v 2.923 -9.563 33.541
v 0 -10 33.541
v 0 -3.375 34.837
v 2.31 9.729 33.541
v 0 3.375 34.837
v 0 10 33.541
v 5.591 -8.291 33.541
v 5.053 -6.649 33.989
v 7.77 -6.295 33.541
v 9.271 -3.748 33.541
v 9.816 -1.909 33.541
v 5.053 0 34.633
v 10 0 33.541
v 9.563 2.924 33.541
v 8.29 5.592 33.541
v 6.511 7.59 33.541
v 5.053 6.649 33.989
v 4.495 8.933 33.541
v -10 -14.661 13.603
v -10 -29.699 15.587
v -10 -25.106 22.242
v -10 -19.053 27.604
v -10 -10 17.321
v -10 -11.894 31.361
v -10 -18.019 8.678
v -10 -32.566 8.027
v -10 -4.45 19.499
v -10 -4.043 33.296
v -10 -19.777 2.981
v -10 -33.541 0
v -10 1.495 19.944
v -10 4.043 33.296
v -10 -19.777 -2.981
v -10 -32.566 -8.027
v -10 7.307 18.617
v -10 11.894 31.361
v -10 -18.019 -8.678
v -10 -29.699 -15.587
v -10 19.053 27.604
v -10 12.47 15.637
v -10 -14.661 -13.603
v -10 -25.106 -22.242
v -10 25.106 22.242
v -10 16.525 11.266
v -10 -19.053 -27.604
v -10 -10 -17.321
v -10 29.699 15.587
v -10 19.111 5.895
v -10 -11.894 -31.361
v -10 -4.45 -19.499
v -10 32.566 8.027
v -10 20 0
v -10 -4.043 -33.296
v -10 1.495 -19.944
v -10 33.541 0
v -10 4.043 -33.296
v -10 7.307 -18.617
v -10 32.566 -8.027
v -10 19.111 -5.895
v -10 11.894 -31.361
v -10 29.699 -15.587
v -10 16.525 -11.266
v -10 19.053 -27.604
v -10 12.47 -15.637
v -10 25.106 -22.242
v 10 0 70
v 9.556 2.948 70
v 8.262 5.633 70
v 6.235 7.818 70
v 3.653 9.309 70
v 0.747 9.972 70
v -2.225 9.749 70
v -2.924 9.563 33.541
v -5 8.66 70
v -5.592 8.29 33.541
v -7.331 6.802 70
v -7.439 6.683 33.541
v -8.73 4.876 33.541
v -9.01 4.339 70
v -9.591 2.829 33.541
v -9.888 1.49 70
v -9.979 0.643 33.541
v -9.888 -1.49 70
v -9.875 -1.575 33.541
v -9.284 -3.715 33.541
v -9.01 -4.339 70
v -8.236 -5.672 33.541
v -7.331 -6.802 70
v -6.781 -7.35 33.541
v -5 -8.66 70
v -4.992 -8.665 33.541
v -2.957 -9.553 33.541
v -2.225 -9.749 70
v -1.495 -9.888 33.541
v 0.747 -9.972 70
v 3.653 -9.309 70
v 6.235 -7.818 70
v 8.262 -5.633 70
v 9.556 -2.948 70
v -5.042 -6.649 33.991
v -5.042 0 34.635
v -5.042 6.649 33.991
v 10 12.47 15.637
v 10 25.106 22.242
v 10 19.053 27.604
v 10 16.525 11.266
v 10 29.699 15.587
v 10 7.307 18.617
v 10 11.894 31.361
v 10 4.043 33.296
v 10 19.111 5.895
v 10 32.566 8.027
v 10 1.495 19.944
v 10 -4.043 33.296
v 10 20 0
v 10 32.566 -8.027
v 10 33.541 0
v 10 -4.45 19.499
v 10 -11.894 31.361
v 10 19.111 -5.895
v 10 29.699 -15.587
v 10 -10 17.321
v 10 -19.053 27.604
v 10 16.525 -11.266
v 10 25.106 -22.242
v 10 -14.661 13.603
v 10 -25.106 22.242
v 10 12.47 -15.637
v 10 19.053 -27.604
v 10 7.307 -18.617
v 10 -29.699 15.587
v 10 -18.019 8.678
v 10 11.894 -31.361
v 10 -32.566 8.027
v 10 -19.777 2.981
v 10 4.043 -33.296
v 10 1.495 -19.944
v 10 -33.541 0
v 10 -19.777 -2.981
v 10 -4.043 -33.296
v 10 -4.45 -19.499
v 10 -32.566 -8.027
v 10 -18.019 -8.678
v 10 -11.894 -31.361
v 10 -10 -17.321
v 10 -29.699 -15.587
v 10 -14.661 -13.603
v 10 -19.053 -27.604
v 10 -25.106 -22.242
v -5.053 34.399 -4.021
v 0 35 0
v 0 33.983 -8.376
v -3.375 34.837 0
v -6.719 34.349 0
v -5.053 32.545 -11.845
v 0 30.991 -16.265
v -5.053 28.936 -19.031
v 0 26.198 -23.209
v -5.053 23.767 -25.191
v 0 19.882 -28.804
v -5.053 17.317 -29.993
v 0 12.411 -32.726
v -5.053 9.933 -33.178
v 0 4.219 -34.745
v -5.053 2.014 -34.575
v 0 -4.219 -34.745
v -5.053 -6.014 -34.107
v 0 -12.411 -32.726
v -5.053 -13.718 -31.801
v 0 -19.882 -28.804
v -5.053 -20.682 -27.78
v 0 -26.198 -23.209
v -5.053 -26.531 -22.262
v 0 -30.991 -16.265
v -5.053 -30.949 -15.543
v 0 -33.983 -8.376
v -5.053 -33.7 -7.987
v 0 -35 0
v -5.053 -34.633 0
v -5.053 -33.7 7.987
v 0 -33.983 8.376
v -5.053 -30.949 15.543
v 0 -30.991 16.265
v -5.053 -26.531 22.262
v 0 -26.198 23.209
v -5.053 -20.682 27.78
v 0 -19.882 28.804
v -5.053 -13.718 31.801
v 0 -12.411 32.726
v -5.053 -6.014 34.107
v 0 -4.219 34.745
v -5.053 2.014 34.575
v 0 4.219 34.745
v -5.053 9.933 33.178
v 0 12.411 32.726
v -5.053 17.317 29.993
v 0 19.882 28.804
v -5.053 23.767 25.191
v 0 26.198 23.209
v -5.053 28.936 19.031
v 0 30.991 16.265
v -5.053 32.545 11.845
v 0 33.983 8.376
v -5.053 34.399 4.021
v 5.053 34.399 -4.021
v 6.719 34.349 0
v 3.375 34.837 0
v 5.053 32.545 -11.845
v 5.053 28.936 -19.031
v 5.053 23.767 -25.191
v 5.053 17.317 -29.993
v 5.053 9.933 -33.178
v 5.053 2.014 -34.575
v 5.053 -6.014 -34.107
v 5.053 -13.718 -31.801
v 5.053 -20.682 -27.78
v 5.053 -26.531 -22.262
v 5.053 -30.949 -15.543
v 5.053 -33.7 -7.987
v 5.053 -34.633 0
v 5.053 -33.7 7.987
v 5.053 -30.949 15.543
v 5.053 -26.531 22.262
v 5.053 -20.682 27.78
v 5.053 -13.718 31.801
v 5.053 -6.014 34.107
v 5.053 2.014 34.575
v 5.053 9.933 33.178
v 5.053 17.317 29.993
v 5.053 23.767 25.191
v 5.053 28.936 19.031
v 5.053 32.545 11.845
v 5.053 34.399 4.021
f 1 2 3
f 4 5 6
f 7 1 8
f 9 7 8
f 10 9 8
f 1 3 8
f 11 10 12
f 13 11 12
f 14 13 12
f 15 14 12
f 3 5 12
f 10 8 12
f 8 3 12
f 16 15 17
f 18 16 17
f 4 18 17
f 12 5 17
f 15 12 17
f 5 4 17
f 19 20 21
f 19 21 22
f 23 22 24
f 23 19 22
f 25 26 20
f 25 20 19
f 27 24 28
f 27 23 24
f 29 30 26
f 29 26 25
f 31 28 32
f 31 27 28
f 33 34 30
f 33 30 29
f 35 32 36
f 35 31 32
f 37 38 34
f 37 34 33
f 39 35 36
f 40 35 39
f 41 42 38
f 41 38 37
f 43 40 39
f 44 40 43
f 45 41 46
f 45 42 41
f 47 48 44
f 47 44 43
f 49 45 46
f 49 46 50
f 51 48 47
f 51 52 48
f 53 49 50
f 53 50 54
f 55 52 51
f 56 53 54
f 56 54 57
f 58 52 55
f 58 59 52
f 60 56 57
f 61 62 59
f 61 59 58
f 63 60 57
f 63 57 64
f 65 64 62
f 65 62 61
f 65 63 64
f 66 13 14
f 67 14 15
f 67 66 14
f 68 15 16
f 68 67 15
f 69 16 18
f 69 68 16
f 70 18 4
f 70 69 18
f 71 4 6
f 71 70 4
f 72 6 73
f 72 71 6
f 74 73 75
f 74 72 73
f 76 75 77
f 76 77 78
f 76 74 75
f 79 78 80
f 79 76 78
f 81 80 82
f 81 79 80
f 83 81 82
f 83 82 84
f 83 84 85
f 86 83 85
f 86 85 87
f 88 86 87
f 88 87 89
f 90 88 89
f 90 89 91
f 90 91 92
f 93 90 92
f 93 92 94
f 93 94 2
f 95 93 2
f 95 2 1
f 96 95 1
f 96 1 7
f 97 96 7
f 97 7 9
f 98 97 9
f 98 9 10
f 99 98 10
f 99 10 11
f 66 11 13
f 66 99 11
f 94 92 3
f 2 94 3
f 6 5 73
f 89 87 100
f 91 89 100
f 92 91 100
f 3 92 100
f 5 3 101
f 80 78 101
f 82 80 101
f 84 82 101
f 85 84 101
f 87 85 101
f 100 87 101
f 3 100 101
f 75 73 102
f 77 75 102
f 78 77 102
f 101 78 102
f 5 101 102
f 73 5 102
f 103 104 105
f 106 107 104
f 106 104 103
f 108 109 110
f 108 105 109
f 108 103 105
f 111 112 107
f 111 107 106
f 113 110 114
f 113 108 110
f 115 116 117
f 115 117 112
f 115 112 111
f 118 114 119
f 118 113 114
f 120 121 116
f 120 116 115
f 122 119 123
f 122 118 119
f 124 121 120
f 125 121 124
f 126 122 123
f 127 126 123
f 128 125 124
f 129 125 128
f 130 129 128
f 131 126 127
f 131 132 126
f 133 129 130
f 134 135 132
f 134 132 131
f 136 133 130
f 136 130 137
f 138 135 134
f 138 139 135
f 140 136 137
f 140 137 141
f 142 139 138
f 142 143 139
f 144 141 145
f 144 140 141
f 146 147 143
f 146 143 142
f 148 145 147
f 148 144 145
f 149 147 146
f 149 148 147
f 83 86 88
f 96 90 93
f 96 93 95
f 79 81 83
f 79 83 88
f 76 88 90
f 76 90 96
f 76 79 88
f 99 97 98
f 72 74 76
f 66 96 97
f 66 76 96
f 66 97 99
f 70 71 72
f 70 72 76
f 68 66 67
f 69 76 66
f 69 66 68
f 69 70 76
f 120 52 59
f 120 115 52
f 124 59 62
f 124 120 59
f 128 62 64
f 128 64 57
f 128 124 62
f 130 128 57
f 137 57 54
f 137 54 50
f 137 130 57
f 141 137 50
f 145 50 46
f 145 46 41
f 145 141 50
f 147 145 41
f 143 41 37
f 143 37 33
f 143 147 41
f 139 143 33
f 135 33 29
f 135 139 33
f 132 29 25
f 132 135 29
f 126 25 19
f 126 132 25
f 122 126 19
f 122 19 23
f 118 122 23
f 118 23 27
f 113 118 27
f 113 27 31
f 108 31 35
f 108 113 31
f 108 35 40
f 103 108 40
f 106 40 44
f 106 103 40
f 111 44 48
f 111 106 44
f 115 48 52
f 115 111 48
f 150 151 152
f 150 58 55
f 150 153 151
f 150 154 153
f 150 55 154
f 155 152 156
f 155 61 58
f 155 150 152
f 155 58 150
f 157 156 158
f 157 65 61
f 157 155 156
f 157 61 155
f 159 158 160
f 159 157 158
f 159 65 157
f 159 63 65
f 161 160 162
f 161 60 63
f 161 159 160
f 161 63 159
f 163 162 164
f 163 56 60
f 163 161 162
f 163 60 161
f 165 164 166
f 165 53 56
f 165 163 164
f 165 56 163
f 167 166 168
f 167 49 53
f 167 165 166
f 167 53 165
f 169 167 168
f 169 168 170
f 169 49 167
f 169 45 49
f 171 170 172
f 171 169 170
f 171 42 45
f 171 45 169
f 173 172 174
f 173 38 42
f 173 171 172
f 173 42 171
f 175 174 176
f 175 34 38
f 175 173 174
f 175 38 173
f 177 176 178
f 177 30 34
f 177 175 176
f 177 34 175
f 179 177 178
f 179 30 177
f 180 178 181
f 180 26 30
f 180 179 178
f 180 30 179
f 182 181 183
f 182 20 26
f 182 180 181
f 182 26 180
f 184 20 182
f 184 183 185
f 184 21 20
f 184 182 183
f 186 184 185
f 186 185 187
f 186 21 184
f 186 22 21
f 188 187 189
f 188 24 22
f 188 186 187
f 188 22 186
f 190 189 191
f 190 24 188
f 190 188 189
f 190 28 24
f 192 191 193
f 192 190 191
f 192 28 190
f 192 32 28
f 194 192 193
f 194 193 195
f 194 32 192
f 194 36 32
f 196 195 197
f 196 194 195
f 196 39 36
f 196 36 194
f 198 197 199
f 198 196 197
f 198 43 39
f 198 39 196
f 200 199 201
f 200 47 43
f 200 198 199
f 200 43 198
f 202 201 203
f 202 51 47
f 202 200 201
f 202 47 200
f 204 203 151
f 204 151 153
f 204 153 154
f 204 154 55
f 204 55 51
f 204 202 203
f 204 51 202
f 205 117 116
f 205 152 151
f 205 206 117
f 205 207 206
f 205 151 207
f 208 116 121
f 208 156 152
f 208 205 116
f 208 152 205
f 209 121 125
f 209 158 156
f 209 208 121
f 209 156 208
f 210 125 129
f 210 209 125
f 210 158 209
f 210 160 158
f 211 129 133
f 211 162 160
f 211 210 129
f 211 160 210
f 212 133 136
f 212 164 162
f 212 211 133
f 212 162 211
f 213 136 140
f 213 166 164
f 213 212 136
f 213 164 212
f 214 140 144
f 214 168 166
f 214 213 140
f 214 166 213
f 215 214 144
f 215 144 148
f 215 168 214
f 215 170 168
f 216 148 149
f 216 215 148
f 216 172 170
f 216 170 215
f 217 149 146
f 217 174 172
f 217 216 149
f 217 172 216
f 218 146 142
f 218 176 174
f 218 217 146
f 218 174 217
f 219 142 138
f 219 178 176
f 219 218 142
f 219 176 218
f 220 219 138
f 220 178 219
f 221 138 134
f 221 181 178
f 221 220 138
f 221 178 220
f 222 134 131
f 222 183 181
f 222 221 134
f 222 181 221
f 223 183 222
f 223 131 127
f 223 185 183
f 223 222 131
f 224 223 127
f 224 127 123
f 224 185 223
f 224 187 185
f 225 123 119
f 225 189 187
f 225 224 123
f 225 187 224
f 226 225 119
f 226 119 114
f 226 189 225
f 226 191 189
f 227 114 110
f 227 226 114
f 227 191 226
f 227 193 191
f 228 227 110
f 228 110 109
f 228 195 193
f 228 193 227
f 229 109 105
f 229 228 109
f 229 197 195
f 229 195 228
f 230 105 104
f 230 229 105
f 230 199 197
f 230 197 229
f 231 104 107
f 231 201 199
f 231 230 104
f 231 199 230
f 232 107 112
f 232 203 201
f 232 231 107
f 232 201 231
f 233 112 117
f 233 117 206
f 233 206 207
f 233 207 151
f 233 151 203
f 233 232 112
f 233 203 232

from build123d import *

# Parameters (mm, degrees)
F3_R = 10


with BuildPart() as f1:
    # F0 (on Top) → F1 (revolve)
    with BuildSketch(Plane.XY):
        with BuildLine():
            ThreePointArc((10, 33.5410196625), (5.0529353752, 34.6333342907), (0, 35))
            Line((0, 35), (0, 20))
            Line((0, 20), (10, 20))
            Line((10, 20), (10, 33.5410196625))
        make_face()
        with BuildLine():
            Line((0, 20), (0, 35))
            ThreePointArc((0, 35), (-5.0529353752, 34.6333342907), (-10, 33.5410196625))
            Line((-10, 33.5410196625), (-10, 20))
            Line((-10, 20), (0, 20))
        make_face()
    revolve(axis=Axis((-5, 0, 0), (-1, 0, 0)))


with BuildPart() as f4:
    # F3 (on offset) → F4 (new body, up to the next surface of F1)
    with BuildSketch(Plane.XY.offset(70)):
        Circle(F3_R)
    extrude(until=Until.NEXT, target=f1.part, dir=(0, 0, -1))


solid = Compound([f1.part, f4.part])
